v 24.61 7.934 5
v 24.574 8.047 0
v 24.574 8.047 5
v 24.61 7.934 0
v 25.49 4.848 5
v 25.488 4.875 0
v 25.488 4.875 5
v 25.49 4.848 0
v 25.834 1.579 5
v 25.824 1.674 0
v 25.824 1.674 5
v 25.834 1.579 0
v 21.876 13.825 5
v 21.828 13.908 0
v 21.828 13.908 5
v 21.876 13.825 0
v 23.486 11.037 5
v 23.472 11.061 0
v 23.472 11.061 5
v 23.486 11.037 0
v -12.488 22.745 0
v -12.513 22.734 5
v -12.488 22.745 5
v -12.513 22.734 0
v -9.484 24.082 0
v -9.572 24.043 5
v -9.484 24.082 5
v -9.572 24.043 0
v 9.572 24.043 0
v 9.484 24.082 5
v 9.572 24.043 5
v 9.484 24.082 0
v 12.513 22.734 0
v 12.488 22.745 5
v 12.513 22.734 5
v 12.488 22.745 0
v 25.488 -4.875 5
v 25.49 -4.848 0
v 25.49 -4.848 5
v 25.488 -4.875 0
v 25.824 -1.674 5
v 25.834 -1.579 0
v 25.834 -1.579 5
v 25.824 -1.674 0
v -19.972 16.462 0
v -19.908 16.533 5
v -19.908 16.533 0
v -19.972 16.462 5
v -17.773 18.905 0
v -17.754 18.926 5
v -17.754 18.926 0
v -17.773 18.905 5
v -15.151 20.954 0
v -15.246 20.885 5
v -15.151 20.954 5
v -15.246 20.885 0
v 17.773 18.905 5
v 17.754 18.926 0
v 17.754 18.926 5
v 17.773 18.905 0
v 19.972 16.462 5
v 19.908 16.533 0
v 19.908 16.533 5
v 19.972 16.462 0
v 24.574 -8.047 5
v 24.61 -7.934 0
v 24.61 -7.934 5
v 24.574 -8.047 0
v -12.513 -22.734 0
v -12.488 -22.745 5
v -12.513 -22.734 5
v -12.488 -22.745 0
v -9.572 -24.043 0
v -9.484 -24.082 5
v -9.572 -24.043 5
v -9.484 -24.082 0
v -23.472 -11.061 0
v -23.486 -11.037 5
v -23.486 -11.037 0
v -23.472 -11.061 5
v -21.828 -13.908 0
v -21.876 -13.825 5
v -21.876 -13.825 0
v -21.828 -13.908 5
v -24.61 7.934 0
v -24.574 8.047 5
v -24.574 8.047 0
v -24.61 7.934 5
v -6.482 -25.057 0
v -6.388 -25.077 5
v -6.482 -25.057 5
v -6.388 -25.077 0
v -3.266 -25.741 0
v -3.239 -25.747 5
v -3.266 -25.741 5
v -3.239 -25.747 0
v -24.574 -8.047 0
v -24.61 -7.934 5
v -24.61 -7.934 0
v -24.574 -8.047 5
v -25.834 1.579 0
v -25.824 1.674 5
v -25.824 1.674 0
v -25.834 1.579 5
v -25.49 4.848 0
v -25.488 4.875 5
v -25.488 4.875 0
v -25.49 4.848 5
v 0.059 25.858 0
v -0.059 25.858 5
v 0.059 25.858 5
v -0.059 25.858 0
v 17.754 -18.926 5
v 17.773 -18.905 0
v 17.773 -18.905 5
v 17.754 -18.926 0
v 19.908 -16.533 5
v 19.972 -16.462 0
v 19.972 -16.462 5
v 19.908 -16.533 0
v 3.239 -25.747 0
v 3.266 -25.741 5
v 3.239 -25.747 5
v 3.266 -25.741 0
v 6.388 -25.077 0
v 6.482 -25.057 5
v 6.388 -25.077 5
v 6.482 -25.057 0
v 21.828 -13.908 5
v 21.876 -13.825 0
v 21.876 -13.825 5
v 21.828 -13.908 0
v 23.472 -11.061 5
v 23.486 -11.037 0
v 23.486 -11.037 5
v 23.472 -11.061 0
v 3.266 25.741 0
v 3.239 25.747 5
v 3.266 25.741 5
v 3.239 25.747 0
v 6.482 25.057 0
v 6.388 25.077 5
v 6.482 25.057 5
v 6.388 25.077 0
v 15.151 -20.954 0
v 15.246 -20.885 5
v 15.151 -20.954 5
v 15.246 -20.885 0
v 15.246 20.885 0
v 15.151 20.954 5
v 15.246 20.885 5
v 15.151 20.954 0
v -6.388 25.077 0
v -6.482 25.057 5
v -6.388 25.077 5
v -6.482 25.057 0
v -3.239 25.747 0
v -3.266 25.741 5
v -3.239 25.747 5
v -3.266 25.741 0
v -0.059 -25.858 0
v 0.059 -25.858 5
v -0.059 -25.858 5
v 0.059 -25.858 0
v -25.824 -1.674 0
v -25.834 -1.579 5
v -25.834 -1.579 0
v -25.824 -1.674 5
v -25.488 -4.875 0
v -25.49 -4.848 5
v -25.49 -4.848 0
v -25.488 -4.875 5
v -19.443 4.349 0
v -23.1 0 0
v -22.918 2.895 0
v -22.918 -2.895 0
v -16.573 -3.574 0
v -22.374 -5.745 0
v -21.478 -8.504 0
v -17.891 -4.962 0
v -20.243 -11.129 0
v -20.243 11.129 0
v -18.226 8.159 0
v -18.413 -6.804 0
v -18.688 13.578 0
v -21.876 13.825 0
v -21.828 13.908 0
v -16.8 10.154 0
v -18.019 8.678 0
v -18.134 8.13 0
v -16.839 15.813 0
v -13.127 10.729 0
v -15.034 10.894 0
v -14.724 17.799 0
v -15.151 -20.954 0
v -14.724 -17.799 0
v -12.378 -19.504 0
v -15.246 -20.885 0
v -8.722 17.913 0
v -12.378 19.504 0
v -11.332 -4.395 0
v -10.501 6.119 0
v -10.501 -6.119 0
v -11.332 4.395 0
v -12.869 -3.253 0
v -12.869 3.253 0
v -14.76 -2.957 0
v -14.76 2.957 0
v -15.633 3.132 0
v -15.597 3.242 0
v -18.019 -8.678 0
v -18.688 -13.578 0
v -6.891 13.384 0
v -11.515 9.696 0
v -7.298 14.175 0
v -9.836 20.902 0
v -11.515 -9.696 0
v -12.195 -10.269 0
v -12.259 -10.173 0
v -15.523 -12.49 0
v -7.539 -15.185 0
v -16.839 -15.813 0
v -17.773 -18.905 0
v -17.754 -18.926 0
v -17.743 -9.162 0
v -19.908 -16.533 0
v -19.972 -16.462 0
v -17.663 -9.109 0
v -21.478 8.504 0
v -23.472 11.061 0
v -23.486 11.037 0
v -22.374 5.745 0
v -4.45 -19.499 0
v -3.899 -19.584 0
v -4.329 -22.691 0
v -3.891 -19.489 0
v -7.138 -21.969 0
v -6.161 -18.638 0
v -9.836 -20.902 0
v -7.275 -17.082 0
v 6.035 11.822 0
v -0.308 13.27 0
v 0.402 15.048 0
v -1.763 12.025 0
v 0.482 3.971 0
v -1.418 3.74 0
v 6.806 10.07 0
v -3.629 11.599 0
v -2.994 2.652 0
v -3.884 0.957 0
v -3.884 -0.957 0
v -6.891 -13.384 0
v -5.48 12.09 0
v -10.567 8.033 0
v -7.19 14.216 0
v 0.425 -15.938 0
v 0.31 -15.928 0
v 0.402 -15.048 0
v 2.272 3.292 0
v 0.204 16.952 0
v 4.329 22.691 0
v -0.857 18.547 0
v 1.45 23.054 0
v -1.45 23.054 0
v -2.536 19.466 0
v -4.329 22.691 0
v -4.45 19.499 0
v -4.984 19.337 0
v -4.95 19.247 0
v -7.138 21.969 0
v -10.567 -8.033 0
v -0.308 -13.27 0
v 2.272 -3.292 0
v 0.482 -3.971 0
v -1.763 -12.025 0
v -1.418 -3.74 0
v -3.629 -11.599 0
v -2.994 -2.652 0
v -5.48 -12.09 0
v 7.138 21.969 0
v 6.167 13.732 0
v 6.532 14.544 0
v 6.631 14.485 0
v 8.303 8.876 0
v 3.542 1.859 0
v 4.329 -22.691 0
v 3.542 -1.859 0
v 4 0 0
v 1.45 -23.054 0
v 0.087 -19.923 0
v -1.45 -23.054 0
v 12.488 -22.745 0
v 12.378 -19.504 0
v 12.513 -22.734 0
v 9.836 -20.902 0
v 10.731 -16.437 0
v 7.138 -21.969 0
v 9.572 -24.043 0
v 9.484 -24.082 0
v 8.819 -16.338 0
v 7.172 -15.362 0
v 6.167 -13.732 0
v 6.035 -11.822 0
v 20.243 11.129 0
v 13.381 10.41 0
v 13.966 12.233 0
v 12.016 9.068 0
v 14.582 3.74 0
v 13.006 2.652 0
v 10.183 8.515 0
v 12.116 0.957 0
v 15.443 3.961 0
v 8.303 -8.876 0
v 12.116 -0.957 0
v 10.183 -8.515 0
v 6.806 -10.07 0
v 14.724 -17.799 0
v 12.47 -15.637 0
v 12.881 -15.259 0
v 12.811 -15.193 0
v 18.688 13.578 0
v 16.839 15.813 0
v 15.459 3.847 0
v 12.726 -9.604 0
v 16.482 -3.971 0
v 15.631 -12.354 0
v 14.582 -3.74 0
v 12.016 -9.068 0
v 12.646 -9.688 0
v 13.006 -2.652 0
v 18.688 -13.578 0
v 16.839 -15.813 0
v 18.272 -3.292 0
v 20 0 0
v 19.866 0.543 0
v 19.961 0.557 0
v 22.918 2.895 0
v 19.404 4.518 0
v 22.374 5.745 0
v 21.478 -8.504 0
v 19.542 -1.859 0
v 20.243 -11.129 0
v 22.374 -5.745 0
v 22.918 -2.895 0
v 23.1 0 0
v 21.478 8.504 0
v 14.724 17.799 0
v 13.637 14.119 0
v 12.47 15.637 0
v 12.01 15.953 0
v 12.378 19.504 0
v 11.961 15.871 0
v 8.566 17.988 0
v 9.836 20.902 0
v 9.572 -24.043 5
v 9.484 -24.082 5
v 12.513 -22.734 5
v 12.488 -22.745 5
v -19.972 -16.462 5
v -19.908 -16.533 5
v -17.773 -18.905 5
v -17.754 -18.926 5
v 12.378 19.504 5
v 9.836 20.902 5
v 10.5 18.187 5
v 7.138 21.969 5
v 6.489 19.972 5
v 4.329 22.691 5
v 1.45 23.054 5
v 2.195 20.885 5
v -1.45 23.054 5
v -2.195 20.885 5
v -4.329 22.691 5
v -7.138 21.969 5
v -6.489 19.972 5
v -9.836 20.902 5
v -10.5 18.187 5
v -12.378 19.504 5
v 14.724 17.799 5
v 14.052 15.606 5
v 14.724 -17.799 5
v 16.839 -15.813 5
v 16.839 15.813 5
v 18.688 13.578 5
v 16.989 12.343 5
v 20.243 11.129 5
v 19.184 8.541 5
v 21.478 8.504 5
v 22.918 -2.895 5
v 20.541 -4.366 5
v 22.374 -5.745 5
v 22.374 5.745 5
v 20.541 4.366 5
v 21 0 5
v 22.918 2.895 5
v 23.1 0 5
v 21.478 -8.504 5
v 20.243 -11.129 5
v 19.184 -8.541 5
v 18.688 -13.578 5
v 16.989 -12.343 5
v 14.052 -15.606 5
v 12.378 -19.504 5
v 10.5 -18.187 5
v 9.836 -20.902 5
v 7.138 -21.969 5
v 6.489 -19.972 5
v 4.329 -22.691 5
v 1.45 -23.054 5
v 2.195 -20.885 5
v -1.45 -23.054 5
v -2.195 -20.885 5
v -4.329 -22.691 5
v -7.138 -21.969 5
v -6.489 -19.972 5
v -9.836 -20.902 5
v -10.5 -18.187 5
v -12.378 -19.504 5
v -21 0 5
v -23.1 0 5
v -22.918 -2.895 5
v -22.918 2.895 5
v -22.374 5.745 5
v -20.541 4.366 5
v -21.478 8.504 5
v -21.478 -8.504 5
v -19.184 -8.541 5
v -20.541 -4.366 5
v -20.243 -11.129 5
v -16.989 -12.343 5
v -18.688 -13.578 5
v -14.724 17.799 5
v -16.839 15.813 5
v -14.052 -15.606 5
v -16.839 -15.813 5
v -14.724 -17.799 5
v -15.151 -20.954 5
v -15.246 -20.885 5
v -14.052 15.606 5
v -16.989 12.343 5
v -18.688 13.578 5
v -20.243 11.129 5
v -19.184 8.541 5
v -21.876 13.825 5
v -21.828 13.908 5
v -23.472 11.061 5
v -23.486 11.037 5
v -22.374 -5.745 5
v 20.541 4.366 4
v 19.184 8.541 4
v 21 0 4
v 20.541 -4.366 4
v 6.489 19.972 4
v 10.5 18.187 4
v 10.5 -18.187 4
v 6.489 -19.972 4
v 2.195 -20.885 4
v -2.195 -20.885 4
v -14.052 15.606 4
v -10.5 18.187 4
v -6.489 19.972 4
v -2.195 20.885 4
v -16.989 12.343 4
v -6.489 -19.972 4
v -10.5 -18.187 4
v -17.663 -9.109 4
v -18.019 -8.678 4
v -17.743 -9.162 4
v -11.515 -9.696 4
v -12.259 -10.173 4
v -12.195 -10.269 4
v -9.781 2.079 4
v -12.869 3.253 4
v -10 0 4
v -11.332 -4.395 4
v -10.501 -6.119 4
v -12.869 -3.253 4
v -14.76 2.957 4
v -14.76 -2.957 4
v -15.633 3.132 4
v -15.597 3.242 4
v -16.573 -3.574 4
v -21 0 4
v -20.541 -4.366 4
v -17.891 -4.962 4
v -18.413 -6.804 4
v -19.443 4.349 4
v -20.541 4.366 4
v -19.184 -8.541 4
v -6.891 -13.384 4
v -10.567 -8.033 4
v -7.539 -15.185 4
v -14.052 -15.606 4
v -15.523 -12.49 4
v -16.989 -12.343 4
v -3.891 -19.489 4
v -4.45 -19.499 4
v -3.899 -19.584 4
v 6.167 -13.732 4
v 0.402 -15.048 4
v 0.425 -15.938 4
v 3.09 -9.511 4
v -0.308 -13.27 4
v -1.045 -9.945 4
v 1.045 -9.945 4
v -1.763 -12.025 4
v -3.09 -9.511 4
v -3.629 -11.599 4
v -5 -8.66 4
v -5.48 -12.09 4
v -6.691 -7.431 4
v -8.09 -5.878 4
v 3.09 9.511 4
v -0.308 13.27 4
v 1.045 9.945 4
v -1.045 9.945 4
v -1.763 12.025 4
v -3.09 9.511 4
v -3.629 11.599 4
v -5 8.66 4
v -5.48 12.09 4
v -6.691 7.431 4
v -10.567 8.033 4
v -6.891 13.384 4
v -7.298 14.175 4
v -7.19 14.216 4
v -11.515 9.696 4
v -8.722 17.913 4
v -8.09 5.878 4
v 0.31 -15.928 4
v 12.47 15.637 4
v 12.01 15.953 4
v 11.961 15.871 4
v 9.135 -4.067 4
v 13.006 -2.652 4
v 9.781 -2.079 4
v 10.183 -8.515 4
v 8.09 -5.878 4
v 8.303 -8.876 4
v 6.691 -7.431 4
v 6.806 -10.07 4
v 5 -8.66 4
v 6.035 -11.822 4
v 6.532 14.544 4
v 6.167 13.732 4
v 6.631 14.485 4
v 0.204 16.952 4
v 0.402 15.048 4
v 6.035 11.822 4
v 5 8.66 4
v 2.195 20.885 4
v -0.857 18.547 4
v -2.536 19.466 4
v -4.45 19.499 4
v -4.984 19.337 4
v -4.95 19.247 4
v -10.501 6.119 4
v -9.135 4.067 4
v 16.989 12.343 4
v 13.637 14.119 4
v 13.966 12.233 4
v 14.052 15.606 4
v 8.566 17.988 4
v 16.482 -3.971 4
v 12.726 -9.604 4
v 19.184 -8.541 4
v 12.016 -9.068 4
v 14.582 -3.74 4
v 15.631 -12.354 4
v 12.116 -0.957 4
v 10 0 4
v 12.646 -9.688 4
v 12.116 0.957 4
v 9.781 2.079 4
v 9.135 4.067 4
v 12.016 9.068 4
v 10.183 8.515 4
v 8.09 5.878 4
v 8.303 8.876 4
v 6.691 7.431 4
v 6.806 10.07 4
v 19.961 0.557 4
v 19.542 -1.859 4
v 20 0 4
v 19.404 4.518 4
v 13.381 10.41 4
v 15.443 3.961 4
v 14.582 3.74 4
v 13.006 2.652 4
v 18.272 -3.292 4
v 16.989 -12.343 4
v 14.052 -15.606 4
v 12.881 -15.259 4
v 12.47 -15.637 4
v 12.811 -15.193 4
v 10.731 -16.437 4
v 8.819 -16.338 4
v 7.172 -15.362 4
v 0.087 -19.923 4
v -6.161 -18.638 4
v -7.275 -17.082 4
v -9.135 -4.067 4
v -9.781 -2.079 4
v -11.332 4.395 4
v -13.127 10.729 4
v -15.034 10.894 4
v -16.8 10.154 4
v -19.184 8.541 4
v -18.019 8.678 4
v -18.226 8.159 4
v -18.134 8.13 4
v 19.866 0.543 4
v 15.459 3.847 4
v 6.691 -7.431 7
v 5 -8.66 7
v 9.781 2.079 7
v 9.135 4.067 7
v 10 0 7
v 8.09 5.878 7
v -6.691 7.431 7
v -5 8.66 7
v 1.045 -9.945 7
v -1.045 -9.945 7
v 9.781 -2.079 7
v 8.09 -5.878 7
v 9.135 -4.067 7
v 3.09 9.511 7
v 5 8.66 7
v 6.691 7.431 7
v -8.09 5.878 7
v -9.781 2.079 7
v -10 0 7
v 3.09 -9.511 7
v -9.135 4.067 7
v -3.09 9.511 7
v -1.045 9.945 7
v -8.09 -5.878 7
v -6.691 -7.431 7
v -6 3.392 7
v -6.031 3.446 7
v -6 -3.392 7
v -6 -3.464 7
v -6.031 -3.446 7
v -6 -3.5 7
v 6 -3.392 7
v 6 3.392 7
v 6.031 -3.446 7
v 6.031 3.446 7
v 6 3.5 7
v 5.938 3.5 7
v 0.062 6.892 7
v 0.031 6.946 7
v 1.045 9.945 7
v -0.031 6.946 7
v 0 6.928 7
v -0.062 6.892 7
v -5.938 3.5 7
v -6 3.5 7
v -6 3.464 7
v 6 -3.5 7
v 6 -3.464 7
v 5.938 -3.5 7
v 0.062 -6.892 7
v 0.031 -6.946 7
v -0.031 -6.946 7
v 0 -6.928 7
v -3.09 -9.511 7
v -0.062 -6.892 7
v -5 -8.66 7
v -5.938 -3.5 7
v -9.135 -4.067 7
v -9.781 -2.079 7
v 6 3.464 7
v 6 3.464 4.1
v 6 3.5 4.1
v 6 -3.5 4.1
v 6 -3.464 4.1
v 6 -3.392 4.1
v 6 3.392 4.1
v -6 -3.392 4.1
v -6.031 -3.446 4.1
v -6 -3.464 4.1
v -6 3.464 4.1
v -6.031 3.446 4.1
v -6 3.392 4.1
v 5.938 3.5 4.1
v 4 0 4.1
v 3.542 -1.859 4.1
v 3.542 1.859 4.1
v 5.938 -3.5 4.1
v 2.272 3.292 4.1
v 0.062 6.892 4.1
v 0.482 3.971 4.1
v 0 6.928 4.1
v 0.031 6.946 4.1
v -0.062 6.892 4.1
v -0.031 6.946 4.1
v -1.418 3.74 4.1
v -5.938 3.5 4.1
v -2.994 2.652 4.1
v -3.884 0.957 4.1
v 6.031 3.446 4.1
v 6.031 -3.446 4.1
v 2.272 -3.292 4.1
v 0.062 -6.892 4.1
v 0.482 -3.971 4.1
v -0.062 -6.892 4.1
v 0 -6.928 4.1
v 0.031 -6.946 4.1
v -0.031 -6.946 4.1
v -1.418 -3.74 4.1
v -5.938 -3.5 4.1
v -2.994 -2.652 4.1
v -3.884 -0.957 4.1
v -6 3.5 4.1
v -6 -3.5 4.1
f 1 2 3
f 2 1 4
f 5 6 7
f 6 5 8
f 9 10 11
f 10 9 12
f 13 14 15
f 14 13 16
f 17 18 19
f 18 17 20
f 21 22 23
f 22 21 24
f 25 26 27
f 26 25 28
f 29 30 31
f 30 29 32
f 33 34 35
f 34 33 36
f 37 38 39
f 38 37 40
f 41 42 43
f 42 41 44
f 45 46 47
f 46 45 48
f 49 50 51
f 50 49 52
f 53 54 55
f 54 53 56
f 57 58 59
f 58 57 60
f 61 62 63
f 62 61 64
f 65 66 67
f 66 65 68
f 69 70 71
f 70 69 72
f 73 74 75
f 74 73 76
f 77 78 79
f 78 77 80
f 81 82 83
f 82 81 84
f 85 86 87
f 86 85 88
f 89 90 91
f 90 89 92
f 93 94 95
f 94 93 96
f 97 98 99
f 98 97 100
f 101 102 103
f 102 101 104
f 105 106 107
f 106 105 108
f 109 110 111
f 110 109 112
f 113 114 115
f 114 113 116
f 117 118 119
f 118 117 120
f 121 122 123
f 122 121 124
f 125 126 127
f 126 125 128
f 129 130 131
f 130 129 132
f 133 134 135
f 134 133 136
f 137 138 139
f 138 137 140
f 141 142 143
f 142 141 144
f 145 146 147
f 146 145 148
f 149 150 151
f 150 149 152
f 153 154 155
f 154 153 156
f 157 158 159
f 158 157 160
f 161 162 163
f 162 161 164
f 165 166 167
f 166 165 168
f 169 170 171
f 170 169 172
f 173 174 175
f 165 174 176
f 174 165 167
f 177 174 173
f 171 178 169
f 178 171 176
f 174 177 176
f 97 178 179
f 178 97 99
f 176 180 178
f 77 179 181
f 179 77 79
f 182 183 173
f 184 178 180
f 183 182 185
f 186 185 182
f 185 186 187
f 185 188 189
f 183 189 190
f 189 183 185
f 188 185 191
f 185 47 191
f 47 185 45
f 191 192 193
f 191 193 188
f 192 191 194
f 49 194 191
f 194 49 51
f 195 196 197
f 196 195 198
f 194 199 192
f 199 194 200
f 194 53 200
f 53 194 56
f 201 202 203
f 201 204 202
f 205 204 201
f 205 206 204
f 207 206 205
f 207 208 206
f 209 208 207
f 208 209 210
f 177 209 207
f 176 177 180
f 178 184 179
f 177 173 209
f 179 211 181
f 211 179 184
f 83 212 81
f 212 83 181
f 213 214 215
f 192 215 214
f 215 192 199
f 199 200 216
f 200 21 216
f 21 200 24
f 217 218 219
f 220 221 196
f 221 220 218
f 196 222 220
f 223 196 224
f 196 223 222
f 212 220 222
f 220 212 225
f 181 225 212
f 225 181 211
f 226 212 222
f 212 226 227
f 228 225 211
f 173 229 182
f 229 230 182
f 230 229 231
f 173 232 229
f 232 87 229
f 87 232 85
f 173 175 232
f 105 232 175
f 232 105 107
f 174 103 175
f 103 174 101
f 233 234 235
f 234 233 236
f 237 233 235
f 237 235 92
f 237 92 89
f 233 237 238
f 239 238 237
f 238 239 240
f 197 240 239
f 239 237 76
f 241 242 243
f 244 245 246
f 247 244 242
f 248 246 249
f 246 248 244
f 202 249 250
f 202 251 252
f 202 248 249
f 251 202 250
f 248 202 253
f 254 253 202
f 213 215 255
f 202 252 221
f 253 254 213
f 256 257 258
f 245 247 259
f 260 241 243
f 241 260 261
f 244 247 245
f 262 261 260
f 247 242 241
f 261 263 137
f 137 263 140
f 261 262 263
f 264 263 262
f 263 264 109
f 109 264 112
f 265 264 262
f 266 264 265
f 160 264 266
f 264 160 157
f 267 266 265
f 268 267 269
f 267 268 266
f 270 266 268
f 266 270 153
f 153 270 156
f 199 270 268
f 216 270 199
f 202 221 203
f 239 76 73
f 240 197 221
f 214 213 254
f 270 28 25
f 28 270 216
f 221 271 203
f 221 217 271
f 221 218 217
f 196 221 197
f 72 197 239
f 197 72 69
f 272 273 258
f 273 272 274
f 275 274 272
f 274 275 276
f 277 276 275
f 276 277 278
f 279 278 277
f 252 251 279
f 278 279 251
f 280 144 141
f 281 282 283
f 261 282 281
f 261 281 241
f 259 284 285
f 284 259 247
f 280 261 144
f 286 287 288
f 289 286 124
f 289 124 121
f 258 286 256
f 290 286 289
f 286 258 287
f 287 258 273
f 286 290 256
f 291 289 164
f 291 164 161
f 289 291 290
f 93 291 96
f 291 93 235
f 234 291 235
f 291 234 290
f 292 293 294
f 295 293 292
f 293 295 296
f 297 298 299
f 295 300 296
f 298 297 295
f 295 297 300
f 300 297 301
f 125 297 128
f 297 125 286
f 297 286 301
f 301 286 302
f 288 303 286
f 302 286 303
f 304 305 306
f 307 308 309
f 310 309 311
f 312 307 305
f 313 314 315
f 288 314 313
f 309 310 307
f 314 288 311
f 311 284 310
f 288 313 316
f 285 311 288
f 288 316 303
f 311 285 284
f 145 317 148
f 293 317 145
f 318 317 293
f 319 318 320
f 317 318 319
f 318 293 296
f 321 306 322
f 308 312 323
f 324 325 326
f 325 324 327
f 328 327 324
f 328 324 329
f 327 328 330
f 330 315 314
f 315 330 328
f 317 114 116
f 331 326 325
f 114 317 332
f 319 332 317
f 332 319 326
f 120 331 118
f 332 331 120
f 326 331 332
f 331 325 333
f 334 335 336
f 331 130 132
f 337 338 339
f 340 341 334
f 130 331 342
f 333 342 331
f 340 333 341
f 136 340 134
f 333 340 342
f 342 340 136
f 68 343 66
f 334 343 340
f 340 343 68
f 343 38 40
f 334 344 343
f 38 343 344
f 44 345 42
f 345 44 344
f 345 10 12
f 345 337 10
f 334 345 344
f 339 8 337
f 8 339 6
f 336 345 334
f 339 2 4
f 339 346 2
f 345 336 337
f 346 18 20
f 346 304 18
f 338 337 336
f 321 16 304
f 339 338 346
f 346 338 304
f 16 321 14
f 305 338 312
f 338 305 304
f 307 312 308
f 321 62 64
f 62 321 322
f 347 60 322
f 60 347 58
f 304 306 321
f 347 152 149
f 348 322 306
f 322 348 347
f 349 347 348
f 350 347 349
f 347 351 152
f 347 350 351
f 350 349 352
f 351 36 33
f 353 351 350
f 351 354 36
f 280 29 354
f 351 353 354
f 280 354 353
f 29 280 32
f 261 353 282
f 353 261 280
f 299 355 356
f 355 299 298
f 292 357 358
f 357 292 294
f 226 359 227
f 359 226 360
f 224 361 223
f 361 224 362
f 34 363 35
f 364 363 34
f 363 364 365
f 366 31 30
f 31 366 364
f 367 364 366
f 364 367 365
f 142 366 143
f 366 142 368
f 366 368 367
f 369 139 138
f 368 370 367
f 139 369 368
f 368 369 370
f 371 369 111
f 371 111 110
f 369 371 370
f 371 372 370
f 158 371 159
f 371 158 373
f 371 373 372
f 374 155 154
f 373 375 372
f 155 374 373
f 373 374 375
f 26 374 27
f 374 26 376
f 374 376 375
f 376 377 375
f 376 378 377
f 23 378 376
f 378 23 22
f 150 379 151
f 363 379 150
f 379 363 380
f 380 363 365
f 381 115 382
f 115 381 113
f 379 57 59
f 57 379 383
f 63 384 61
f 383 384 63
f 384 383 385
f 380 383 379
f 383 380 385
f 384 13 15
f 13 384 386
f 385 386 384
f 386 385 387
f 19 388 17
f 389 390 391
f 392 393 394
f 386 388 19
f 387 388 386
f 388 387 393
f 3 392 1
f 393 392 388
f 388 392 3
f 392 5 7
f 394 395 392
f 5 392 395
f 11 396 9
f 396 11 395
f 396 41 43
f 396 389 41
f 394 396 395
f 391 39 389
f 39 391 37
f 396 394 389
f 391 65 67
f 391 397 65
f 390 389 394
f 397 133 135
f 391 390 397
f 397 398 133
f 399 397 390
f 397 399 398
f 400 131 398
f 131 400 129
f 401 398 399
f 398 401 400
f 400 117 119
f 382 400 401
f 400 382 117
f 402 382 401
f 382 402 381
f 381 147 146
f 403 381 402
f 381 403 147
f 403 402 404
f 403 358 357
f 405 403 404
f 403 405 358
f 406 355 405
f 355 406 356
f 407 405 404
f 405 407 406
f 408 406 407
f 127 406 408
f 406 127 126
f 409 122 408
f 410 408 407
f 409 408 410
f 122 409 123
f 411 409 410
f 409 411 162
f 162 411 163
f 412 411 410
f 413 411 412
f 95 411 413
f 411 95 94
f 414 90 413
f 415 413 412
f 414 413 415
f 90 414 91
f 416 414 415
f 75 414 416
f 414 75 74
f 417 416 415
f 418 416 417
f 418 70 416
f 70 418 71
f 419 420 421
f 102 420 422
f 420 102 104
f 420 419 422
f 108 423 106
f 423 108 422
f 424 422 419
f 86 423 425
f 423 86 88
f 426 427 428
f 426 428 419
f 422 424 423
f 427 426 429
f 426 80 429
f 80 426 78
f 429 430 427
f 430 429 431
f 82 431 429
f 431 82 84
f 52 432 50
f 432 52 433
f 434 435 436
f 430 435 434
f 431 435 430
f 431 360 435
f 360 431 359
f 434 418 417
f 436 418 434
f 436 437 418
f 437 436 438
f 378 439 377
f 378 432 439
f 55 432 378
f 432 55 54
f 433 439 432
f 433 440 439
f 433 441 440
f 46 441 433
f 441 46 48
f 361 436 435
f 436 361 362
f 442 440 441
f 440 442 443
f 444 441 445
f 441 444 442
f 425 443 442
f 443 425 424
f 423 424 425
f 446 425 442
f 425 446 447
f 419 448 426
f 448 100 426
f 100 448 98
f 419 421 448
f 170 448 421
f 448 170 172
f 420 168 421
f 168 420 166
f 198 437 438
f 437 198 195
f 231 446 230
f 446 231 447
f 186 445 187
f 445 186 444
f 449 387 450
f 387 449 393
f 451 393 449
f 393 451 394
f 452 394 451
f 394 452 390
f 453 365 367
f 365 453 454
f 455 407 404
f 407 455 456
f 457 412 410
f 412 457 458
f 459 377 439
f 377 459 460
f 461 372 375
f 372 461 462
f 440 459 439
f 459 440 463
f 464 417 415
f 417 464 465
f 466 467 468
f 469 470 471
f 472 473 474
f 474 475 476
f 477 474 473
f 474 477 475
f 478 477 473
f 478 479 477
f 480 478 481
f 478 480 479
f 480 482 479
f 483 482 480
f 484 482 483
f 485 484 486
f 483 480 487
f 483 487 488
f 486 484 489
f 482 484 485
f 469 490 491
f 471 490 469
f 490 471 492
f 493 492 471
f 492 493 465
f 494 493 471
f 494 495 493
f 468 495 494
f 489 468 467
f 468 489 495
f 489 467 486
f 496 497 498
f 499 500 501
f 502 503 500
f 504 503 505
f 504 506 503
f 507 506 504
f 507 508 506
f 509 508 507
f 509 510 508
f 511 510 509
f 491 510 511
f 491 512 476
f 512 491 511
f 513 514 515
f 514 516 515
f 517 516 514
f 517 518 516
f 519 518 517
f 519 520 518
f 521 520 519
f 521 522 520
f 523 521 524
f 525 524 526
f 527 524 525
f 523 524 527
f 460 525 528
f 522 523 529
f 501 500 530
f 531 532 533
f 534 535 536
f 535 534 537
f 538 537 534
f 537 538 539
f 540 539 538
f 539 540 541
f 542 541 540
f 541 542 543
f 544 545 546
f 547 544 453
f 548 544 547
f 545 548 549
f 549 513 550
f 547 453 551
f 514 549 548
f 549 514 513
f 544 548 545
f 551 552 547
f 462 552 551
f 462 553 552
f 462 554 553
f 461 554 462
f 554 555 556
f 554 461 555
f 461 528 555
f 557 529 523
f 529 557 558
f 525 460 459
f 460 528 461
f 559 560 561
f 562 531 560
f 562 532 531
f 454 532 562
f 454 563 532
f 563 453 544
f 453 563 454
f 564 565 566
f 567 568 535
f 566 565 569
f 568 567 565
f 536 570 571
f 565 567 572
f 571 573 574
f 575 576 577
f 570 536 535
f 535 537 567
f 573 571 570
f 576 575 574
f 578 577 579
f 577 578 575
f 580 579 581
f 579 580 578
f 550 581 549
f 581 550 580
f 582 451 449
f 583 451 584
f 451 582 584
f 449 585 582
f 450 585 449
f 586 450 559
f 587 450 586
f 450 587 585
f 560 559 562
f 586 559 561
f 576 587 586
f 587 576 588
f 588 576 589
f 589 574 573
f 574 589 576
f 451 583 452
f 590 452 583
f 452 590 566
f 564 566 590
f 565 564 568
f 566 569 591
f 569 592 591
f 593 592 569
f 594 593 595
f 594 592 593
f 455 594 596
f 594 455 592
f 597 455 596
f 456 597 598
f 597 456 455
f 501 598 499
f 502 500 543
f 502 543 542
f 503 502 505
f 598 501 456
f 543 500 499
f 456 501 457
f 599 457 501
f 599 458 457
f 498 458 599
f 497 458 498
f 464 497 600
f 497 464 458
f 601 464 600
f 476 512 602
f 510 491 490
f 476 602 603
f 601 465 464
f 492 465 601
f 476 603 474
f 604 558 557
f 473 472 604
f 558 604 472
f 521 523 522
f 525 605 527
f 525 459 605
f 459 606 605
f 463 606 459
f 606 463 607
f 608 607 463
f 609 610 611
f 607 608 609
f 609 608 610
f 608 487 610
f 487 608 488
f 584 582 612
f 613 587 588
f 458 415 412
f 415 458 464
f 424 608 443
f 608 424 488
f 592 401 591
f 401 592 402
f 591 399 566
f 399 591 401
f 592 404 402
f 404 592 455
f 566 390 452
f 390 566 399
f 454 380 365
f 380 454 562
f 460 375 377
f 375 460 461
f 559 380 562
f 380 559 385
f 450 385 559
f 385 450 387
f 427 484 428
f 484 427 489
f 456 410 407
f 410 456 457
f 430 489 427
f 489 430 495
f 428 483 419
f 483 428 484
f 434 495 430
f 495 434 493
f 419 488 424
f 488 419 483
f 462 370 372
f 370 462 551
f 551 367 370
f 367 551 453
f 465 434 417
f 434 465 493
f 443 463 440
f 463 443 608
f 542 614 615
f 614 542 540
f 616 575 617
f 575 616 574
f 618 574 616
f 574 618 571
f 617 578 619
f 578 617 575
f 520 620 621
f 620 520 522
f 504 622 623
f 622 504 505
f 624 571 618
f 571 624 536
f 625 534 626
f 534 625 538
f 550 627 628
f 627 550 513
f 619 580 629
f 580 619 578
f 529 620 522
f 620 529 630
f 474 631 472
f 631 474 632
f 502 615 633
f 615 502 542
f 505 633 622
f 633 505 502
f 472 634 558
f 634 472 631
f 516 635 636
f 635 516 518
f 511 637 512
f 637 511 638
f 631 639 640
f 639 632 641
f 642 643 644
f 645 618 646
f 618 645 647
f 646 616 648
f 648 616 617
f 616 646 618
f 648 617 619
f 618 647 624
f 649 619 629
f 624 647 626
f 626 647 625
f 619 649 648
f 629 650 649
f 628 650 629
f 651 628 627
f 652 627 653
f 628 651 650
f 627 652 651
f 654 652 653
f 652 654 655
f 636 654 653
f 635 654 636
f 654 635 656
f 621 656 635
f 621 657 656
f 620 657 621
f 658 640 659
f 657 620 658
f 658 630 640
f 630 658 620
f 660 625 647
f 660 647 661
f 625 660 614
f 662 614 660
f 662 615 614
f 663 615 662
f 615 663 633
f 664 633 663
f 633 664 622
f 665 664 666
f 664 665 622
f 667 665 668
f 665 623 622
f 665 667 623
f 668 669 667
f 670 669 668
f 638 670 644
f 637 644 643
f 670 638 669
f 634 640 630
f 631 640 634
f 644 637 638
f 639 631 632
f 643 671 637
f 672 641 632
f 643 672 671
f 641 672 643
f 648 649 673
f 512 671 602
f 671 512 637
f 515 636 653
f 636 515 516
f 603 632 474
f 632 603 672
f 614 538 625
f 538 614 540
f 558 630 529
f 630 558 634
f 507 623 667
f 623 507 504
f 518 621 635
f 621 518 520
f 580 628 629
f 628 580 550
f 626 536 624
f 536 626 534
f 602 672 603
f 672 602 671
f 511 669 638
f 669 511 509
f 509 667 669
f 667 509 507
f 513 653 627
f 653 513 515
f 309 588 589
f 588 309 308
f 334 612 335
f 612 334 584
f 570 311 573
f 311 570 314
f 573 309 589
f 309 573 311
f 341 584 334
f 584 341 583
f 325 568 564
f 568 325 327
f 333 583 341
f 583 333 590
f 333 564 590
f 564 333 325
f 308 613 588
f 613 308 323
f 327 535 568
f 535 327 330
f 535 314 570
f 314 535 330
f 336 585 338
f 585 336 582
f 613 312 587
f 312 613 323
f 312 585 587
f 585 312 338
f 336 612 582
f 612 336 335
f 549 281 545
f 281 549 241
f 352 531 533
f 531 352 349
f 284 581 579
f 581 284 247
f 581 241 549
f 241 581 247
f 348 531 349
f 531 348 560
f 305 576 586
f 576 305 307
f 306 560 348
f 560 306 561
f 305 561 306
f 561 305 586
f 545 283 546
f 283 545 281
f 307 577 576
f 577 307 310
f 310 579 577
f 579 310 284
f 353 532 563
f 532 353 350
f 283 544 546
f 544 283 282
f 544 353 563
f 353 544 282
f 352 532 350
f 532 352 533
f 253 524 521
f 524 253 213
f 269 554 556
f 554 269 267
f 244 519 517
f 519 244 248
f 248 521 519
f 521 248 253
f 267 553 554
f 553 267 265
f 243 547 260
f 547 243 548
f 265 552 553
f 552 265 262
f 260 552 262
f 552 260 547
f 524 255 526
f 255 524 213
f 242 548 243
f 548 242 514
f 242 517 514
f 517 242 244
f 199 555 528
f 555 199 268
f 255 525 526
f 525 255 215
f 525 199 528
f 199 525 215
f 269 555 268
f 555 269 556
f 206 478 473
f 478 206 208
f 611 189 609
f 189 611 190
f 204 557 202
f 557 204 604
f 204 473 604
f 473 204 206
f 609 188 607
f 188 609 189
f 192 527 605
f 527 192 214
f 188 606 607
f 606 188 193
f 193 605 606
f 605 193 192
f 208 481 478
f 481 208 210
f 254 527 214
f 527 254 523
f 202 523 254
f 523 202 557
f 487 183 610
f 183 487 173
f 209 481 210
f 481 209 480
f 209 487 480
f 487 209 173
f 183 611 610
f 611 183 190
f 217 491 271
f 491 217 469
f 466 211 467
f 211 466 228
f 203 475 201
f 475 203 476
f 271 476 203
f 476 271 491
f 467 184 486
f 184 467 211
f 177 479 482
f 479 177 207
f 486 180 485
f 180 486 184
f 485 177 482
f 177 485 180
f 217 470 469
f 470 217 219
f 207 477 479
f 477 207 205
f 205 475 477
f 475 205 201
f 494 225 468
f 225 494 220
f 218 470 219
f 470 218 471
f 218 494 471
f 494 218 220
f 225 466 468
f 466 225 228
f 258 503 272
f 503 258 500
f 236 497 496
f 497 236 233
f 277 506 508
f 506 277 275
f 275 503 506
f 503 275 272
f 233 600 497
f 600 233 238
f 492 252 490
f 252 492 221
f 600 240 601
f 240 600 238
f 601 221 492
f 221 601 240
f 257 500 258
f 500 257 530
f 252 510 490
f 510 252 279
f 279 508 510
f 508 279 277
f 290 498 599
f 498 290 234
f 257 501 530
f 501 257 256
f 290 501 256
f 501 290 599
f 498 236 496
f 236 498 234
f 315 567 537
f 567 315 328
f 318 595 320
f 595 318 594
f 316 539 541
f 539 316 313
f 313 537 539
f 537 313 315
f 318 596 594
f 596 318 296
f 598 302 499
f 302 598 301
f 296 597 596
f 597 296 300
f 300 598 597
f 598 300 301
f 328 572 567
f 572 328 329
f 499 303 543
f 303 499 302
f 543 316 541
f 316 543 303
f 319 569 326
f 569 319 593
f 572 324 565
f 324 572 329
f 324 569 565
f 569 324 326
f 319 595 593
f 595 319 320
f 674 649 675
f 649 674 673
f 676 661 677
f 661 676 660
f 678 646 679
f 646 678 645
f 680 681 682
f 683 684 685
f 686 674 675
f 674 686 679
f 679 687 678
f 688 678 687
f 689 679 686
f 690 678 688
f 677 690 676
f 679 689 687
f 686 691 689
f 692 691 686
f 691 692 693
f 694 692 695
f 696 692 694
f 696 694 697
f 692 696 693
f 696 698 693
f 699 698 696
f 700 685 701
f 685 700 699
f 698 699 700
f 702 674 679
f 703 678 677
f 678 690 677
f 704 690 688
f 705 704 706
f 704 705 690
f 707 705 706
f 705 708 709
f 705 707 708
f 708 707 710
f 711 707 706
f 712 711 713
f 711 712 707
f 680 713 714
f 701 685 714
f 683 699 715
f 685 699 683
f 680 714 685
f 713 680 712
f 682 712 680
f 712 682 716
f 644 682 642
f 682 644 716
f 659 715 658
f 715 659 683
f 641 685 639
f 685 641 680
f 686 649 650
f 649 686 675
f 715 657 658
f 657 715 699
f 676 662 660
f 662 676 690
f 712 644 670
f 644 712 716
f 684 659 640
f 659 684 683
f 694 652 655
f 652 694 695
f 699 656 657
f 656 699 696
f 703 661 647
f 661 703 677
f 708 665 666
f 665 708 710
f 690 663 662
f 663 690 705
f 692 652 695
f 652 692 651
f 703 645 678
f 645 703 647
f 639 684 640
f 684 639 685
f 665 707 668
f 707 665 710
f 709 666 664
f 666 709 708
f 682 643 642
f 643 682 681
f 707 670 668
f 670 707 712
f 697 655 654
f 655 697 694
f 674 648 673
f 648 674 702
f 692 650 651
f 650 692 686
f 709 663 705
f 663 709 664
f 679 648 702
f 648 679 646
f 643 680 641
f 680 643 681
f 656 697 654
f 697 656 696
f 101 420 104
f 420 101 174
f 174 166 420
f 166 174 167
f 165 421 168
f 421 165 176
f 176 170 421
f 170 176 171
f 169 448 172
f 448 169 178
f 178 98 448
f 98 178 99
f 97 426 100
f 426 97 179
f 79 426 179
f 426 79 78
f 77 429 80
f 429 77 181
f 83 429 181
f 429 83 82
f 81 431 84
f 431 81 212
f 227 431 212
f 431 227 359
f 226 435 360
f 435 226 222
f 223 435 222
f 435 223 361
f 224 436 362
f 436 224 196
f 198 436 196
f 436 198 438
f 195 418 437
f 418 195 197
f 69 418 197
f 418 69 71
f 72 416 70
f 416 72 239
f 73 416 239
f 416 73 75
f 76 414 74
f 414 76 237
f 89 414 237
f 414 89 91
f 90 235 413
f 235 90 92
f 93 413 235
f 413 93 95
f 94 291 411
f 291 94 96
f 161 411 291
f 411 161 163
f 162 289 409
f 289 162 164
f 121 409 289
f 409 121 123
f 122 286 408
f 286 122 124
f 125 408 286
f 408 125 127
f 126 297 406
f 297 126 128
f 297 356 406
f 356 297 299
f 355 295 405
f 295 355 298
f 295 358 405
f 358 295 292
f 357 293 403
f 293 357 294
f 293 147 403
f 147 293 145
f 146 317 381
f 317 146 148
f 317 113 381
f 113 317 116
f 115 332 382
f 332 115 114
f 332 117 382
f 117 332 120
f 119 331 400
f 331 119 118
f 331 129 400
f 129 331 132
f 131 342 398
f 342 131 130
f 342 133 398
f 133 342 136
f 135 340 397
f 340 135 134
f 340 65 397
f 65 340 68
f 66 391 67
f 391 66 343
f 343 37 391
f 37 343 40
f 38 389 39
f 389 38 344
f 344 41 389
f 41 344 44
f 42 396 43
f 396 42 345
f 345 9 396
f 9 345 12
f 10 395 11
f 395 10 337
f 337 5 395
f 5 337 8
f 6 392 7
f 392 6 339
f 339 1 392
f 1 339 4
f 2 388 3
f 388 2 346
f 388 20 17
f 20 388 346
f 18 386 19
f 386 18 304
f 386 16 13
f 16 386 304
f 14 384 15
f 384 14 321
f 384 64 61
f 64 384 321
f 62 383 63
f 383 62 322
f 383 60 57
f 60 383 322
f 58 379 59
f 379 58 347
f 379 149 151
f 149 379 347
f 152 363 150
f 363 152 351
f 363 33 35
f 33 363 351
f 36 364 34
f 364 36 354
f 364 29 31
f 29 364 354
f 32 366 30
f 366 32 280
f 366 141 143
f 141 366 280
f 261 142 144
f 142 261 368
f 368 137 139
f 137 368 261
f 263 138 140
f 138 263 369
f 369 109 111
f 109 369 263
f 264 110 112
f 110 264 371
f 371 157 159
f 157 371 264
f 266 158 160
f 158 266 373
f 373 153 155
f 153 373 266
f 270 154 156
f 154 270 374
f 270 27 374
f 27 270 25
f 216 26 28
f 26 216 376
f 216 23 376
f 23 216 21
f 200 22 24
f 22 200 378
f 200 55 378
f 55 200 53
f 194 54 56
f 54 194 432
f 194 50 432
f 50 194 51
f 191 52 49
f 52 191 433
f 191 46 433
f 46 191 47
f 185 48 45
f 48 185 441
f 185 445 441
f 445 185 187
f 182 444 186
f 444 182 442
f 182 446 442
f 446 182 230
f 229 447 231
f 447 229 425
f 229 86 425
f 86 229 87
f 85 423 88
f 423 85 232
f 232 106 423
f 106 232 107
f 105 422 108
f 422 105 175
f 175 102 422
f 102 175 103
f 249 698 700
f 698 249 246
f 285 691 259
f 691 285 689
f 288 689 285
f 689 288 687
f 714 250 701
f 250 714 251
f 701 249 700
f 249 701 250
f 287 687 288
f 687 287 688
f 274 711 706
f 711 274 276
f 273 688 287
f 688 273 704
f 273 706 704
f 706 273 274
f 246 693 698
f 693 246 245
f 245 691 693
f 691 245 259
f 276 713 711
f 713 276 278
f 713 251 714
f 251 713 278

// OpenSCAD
// re-implementation of the RepRap Wade extruder's large gear
// done as a coding-dojo exercise
// at the free software studies group of the engineering school
// of the University of São Paulo http://www.polignu.org

// This model is released to the public domain

r_corpo=25;
h_corpo=5;

r_2=10;
h_2=7;

r_3=4;
h_3=10;

r_gota=4;
h_gota=7;
t_gota=16;

xc=12;
yc=7;
zc=3;

largura_borda=r_gota;
tamanho_dente=r_gota/2;
num_dentes=50;

difference (){
	
	union () {
		difference() {
			cylinder (r=r_corpo+tamanho_dente/2, h=h_corpo);
			translate ([0,0,h_corpo*0.8])
			cylinder (r=r_corpo-largura_borda, h=h_corpo*0.2+0.1);
			
		}
		cylinder (r=r_2, h=h_2);
	}

	translate([0,0,-1])
	cylinder (r=r_3, h=h_3);
	for (i=[0:6]){
		rotate ([0, 0, i*360/7])
		translate ([t_gota,0,-1]){
			cylinder (r=r_gota, h=h_gota);
			//translate([0,0,0])
			rotate([0,0,2*r_gota])
			cube ([r_gota, r_gota, h_gota]);
			
		}
	}

	for(i=[0:3]){
		rotate([0,0,i*360/3])
		translate([-xc/2,-yc/2,h_2-zc+0.1])
		cube([xc,yc,zc]);
	}

   // dentes
	for (i=[0:num_dentes]){
		rotate ([0,0,i*360/num_dentes])
		translate([-r_corpo-0.1,0,-0.1]) {
			cylinder ($fn=3,r=tamanho_dente, h=h_3);    
     }
	}
}
